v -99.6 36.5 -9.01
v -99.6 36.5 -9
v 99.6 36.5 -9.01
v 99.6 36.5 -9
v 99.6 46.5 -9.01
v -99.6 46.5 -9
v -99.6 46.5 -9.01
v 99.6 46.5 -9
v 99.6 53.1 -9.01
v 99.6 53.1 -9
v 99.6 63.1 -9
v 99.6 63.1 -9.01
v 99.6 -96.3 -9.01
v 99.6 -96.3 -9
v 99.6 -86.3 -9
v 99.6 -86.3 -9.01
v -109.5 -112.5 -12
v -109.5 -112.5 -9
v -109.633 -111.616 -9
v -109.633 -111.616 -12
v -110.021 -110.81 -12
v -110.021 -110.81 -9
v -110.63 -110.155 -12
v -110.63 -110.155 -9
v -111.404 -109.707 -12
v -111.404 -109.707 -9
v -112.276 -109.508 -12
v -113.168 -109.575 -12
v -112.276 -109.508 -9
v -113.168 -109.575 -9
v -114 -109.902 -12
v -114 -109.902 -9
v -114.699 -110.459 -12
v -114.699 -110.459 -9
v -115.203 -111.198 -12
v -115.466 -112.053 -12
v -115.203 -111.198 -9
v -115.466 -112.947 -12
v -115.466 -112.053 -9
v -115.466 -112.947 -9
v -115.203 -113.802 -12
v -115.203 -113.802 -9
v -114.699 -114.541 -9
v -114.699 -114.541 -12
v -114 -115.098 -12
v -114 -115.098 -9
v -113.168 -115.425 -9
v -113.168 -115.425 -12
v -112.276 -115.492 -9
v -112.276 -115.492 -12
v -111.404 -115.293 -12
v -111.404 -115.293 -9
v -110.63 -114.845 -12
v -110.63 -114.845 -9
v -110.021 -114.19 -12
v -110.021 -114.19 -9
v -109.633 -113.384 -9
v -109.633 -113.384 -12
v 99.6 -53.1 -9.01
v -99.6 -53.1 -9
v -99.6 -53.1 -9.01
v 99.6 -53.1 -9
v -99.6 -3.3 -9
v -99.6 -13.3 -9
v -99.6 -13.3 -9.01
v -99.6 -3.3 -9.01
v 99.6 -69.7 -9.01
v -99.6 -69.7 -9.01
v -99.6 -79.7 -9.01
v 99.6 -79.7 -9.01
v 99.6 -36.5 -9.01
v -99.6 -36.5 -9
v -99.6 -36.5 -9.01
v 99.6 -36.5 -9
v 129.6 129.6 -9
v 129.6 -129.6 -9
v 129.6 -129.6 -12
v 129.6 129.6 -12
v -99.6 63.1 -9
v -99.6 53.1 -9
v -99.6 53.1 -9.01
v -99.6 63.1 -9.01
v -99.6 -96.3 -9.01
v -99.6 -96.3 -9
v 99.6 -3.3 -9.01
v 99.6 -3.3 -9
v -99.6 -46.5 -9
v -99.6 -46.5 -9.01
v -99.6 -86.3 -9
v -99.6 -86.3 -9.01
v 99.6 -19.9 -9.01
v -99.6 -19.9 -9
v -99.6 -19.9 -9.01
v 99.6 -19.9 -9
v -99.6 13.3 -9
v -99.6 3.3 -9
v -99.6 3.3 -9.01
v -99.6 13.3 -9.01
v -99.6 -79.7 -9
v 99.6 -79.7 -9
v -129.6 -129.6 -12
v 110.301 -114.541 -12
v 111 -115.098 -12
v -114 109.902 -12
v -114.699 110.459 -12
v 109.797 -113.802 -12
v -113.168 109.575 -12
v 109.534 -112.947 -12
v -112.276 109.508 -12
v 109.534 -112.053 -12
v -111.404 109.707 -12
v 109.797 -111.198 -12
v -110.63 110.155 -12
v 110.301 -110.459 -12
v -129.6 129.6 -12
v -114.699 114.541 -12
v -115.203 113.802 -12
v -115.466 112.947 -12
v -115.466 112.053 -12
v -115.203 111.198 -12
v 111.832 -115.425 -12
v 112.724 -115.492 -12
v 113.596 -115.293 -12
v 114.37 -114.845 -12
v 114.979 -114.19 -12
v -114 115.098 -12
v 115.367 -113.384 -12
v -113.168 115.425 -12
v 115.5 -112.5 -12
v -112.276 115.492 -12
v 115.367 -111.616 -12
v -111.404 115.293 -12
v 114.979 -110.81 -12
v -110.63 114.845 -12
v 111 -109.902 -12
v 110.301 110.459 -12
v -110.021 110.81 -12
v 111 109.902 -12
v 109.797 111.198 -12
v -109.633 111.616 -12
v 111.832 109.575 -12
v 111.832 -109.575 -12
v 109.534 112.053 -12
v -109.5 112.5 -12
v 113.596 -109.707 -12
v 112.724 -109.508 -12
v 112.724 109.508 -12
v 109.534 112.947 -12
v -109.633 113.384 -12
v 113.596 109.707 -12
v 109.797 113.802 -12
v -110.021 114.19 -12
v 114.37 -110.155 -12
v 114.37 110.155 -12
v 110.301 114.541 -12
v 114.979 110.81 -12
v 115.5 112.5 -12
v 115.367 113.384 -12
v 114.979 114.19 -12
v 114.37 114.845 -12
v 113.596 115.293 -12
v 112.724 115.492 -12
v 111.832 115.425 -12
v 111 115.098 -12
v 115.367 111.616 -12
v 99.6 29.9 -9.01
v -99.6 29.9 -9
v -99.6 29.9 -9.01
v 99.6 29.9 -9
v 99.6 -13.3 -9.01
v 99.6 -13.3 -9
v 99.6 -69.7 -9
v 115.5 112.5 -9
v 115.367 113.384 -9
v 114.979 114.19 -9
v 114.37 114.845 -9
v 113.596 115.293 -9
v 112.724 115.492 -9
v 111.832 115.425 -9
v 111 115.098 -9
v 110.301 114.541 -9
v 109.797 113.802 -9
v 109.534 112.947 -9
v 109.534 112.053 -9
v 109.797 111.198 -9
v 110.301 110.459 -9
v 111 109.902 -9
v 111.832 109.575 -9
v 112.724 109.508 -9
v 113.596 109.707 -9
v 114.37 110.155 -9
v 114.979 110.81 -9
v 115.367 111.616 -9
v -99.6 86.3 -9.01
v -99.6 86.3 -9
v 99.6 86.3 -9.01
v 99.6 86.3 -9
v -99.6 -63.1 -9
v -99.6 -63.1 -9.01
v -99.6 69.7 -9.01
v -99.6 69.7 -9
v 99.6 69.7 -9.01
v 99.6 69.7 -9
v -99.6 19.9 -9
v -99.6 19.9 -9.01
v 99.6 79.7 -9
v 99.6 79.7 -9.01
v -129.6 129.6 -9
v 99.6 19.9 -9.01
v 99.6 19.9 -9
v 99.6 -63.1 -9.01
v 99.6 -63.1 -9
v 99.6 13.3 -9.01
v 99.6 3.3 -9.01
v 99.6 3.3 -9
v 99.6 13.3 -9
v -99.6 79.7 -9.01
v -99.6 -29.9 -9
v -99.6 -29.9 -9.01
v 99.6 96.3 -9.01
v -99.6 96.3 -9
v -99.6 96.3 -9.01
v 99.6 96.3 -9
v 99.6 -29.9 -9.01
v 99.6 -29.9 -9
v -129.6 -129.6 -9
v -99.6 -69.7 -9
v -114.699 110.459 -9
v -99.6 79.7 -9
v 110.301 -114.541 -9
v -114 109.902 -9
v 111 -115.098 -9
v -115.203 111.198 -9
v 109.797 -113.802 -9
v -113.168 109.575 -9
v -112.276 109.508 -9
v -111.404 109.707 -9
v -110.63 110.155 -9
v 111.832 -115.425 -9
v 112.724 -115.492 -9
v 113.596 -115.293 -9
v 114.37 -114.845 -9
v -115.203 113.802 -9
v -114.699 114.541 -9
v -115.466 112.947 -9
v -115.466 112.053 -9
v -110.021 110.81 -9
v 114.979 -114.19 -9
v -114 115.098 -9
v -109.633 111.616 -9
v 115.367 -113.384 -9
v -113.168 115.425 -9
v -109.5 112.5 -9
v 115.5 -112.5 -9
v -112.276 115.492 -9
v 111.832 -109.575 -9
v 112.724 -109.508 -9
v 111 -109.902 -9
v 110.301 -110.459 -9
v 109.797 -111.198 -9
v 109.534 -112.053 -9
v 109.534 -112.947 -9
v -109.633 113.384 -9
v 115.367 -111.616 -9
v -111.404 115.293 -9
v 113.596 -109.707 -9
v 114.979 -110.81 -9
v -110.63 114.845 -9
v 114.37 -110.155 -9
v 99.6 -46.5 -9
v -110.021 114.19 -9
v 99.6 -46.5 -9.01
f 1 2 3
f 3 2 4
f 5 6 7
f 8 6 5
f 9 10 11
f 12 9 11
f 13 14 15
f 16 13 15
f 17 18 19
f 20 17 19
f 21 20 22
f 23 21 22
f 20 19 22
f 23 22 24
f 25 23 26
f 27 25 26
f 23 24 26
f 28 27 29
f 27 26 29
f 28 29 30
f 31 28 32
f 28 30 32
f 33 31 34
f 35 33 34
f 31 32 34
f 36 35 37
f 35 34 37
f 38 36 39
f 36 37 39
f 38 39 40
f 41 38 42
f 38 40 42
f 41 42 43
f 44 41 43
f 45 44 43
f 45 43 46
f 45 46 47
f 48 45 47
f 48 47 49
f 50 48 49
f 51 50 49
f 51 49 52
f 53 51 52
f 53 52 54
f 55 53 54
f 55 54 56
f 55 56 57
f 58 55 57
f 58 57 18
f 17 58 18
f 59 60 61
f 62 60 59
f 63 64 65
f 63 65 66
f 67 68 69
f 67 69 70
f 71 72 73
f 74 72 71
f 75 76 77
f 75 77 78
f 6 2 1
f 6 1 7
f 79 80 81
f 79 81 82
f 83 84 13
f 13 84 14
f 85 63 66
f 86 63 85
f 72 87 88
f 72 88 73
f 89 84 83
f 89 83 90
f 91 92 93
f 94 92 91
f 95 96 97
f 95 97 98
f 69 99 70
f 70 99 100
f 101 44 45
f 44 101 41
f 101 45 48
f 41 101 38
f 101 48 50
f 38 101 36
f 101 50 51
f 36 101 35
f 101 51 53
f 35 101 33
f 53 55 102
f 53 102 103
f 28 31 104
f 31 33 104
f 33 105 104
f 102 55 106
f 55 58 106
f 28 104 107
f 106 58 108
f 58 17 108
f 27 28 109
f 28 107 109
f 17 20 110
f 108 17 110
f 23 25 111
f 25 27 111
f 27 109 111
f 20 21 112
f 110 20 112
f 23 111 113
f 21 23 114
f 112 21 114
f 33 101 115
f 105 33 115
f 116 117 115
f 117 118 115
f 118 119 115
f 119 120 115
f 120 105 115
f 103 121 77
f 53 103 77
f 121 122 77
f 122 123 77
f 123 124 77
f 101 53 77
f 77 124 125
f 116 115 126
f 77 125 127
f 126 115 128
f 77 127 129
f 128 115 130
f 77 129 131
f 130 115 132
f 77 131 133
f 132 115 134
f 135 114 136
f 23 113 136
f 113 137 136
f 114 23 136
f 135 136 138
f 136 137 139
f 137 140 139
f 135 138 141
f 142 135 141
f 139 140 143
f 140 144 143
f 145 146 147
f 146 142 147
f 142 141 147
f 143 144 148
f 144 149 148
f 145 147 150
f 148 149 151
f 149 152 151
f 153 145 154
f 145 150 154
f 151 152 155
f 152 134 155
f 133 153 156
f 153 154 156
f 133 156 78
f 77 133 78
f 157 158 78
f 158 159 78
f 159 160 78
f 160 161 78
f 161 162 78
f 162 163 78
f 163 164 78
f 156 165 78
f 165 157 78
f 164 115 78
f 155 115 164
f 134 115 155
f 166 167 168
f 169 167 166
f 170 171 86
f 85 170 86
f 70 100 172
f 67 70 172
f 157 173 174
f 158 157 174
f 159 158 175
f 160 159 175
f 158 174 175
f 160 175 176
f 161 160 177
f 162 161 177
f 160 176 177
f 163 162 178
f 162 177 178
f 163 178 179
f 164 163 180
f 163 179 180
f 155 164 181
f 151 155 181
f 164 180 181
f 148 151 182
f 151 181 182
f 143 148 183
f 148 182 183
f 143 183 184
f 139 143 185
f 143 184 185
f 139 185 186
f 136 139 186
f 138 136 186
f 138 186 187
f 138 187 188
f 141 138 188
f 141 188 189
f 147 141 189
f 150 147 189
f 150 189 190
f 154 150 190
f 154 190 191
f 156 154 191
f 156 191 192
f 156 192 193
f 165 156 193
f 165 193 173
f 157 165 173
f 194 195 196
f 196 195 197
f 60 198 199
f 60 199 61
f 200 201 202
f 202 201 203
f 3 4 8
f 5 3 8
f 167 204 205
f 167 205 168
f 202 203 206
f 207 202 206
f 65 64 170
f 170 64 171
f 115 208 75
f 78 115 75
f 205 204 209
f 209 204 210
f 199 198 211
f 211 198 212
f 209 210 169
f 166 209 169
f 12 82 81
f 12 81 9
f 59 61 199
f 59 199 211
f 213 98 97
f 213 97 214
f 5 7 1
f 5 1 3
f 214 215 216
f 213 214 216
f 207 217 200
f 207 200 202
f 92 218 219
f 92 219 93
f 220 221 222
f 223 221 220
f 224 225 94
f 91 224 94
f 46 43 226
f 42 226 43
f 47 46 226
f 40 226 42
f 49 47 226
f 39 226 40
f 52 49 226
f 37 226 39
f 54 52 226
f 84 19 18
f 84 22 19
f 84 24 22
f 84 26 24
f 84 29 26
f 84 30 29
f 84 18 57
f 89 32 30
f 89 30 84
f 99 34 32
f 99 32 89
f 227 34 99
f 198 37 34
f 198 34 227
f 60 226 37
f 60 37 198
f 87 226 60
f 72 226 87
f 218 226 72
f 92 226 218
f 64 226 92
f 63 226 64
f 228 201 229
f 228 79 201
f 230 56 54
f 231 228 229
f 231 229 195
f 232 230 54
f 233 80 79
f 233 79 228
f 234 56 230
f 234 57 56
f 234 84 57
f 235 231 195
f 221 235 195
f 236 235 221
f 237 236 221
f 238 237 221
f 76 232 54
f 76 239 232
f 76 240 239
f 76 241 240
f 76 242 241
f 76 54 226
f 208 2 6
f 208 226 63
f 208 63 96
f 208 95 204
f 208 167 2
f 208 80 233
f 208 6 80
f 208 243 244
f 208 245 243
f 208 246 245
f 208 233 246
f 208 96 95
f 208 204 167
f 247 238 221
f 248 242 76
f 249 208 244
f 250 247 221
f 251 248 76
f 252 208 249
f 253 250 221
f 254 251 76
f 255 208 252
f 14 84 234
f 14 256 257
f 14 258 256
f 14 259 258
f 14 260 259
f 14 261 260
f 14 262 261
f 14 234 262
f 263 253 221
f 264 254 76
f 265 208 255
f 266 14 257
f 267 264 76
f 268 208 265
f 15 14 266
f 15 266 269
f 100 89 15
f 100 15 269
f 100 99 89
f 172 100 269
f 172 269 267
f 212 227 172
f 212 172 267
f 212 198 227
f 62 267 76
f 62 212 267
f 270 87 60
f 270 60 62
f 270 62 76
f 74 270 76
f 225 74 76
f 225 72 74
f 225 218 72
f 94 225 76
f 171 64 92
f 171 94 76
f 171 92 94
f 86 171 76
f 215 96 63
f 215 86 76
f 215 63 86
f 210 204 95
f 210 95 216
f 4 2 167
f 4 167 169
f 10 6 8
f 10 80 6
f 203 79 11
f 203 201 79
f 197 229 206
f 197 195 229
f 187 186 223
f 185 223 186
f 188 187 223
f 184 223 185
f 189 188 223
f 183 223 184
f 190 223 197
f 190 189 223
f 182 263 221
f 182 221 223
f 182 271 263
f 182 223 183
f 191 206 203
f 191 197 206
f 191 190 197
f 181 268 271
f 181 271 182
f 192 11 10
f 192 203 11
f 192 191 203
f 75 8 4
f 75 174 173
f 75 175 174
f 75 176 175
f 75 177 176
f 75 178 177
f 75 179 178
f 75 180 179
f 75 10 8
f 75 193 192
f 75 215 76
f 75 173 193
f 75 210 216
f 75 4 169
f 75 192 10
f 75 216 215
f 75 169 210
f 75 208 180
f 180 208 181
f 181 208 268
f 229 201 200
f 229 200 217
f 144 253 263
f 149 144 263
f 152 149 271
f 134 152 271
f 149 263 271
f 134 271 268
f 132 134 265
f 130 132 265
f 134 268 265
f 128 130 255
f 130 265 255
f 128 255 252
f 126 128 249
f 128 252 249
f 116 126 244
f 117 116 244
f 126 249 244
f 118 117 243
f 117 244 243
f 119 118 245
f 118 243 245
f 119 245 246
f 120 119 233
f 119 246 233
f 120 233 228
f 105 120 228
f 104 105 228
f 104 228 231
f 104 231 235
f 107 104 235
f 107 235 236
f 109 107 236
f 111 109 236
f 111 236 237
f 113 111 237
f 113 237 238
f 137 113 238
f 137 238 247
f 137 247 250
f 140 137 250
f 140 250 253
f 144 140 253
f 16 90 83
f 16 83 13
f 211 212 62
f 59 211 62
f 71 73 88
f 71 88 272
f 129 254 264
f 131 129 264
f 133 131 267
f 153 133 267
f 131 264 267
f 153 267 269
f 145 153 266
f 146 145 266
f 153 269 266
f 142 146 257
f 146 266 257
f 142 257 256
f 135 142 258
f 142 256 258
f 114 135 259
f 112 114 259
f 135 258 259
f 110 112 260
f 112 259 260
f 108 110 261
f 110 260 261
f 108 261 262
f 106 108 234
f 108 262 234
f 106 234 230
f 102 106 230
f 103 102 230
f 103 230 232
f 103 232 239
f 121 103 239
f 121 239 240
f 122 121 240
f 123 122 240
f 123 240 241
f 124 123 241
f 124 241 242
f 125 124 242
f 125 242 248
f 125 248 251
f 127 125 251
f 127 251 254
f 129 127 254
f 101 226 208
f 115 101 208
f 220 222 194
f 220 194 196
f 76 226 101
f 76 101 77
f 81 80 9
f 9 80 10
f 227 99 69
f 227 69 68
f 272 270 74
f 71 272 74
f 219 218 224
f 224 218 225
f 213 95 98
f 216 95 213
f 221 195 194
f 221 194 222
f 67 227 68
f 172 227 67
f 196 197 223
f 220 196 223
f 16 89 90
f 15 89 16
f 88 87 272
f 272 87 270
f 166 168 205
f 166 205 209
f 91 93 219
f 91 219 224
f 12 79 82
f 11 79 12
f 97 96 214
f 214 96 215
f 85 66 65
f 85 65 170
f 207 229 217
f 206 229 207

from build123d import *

# Parameters (mm, degrees)
SKETCH007_W            = 259.2
SKETCH007_H            = 259.2
PAD004_DEPTH           = 3
SKETCH008_W            = 199.2
SKETCH008_H            = 10
POCKET003_DEPTH        = 9.01
LINEARPATTERN005_COUNT = 12
LINEARPATTERN005_PITCH = 16.6
SKETCH013_R            = 3
POCKET008_DEPTH        = 12.001


with BuildPart() as part:
    # Sketch007 → Pad004 (new body)
    with BuildSketch(Plane.XY.offset(-9)):
        Rectangle(SKETCH007_W, SKETCH007_H)
    extrude(amount=-PAD004_DEPTH)

    # Sketch008 → Pocket003 (cut)
    with BuildSketch(Plane.XY):
        with Locations((0, 91.3)):
            Rectangle(SKETCH008_W, SKETCH008_H)
    pocket003 = extrude(amount=-POCKET003_DEPTH, mode=Mode.SUBTRACT)

    # LinearPattern005: Pocket003 ×12
    with Locations(*[(0, -i * LINEARPATTERN005_PITCH, 0) for i in range(1, LINEARPATTERN005_COUNT)]):
        add(pocket003, mode=Mode.SUBTRACT)

    # Sketch013 → Pocket008 (cut, through all)
    with BuildSketch(Plane.XY):
        with Locations((-112.5, 112.5)):
            Circle(SKETCH013_R)
        with Locations((112.5, 112.5)):
            Circle(SKETCH013_R)
        with Locations((112.5, -112.5)):
            Circle(SKETCH013_R)
        with Locations((-112.5, -112.5)):
            Circle(SKETCH013_R)
    extrude(amount=-POCKET008_DEPTH, mode=Mode.SUBTRACT)


solid = part.part
